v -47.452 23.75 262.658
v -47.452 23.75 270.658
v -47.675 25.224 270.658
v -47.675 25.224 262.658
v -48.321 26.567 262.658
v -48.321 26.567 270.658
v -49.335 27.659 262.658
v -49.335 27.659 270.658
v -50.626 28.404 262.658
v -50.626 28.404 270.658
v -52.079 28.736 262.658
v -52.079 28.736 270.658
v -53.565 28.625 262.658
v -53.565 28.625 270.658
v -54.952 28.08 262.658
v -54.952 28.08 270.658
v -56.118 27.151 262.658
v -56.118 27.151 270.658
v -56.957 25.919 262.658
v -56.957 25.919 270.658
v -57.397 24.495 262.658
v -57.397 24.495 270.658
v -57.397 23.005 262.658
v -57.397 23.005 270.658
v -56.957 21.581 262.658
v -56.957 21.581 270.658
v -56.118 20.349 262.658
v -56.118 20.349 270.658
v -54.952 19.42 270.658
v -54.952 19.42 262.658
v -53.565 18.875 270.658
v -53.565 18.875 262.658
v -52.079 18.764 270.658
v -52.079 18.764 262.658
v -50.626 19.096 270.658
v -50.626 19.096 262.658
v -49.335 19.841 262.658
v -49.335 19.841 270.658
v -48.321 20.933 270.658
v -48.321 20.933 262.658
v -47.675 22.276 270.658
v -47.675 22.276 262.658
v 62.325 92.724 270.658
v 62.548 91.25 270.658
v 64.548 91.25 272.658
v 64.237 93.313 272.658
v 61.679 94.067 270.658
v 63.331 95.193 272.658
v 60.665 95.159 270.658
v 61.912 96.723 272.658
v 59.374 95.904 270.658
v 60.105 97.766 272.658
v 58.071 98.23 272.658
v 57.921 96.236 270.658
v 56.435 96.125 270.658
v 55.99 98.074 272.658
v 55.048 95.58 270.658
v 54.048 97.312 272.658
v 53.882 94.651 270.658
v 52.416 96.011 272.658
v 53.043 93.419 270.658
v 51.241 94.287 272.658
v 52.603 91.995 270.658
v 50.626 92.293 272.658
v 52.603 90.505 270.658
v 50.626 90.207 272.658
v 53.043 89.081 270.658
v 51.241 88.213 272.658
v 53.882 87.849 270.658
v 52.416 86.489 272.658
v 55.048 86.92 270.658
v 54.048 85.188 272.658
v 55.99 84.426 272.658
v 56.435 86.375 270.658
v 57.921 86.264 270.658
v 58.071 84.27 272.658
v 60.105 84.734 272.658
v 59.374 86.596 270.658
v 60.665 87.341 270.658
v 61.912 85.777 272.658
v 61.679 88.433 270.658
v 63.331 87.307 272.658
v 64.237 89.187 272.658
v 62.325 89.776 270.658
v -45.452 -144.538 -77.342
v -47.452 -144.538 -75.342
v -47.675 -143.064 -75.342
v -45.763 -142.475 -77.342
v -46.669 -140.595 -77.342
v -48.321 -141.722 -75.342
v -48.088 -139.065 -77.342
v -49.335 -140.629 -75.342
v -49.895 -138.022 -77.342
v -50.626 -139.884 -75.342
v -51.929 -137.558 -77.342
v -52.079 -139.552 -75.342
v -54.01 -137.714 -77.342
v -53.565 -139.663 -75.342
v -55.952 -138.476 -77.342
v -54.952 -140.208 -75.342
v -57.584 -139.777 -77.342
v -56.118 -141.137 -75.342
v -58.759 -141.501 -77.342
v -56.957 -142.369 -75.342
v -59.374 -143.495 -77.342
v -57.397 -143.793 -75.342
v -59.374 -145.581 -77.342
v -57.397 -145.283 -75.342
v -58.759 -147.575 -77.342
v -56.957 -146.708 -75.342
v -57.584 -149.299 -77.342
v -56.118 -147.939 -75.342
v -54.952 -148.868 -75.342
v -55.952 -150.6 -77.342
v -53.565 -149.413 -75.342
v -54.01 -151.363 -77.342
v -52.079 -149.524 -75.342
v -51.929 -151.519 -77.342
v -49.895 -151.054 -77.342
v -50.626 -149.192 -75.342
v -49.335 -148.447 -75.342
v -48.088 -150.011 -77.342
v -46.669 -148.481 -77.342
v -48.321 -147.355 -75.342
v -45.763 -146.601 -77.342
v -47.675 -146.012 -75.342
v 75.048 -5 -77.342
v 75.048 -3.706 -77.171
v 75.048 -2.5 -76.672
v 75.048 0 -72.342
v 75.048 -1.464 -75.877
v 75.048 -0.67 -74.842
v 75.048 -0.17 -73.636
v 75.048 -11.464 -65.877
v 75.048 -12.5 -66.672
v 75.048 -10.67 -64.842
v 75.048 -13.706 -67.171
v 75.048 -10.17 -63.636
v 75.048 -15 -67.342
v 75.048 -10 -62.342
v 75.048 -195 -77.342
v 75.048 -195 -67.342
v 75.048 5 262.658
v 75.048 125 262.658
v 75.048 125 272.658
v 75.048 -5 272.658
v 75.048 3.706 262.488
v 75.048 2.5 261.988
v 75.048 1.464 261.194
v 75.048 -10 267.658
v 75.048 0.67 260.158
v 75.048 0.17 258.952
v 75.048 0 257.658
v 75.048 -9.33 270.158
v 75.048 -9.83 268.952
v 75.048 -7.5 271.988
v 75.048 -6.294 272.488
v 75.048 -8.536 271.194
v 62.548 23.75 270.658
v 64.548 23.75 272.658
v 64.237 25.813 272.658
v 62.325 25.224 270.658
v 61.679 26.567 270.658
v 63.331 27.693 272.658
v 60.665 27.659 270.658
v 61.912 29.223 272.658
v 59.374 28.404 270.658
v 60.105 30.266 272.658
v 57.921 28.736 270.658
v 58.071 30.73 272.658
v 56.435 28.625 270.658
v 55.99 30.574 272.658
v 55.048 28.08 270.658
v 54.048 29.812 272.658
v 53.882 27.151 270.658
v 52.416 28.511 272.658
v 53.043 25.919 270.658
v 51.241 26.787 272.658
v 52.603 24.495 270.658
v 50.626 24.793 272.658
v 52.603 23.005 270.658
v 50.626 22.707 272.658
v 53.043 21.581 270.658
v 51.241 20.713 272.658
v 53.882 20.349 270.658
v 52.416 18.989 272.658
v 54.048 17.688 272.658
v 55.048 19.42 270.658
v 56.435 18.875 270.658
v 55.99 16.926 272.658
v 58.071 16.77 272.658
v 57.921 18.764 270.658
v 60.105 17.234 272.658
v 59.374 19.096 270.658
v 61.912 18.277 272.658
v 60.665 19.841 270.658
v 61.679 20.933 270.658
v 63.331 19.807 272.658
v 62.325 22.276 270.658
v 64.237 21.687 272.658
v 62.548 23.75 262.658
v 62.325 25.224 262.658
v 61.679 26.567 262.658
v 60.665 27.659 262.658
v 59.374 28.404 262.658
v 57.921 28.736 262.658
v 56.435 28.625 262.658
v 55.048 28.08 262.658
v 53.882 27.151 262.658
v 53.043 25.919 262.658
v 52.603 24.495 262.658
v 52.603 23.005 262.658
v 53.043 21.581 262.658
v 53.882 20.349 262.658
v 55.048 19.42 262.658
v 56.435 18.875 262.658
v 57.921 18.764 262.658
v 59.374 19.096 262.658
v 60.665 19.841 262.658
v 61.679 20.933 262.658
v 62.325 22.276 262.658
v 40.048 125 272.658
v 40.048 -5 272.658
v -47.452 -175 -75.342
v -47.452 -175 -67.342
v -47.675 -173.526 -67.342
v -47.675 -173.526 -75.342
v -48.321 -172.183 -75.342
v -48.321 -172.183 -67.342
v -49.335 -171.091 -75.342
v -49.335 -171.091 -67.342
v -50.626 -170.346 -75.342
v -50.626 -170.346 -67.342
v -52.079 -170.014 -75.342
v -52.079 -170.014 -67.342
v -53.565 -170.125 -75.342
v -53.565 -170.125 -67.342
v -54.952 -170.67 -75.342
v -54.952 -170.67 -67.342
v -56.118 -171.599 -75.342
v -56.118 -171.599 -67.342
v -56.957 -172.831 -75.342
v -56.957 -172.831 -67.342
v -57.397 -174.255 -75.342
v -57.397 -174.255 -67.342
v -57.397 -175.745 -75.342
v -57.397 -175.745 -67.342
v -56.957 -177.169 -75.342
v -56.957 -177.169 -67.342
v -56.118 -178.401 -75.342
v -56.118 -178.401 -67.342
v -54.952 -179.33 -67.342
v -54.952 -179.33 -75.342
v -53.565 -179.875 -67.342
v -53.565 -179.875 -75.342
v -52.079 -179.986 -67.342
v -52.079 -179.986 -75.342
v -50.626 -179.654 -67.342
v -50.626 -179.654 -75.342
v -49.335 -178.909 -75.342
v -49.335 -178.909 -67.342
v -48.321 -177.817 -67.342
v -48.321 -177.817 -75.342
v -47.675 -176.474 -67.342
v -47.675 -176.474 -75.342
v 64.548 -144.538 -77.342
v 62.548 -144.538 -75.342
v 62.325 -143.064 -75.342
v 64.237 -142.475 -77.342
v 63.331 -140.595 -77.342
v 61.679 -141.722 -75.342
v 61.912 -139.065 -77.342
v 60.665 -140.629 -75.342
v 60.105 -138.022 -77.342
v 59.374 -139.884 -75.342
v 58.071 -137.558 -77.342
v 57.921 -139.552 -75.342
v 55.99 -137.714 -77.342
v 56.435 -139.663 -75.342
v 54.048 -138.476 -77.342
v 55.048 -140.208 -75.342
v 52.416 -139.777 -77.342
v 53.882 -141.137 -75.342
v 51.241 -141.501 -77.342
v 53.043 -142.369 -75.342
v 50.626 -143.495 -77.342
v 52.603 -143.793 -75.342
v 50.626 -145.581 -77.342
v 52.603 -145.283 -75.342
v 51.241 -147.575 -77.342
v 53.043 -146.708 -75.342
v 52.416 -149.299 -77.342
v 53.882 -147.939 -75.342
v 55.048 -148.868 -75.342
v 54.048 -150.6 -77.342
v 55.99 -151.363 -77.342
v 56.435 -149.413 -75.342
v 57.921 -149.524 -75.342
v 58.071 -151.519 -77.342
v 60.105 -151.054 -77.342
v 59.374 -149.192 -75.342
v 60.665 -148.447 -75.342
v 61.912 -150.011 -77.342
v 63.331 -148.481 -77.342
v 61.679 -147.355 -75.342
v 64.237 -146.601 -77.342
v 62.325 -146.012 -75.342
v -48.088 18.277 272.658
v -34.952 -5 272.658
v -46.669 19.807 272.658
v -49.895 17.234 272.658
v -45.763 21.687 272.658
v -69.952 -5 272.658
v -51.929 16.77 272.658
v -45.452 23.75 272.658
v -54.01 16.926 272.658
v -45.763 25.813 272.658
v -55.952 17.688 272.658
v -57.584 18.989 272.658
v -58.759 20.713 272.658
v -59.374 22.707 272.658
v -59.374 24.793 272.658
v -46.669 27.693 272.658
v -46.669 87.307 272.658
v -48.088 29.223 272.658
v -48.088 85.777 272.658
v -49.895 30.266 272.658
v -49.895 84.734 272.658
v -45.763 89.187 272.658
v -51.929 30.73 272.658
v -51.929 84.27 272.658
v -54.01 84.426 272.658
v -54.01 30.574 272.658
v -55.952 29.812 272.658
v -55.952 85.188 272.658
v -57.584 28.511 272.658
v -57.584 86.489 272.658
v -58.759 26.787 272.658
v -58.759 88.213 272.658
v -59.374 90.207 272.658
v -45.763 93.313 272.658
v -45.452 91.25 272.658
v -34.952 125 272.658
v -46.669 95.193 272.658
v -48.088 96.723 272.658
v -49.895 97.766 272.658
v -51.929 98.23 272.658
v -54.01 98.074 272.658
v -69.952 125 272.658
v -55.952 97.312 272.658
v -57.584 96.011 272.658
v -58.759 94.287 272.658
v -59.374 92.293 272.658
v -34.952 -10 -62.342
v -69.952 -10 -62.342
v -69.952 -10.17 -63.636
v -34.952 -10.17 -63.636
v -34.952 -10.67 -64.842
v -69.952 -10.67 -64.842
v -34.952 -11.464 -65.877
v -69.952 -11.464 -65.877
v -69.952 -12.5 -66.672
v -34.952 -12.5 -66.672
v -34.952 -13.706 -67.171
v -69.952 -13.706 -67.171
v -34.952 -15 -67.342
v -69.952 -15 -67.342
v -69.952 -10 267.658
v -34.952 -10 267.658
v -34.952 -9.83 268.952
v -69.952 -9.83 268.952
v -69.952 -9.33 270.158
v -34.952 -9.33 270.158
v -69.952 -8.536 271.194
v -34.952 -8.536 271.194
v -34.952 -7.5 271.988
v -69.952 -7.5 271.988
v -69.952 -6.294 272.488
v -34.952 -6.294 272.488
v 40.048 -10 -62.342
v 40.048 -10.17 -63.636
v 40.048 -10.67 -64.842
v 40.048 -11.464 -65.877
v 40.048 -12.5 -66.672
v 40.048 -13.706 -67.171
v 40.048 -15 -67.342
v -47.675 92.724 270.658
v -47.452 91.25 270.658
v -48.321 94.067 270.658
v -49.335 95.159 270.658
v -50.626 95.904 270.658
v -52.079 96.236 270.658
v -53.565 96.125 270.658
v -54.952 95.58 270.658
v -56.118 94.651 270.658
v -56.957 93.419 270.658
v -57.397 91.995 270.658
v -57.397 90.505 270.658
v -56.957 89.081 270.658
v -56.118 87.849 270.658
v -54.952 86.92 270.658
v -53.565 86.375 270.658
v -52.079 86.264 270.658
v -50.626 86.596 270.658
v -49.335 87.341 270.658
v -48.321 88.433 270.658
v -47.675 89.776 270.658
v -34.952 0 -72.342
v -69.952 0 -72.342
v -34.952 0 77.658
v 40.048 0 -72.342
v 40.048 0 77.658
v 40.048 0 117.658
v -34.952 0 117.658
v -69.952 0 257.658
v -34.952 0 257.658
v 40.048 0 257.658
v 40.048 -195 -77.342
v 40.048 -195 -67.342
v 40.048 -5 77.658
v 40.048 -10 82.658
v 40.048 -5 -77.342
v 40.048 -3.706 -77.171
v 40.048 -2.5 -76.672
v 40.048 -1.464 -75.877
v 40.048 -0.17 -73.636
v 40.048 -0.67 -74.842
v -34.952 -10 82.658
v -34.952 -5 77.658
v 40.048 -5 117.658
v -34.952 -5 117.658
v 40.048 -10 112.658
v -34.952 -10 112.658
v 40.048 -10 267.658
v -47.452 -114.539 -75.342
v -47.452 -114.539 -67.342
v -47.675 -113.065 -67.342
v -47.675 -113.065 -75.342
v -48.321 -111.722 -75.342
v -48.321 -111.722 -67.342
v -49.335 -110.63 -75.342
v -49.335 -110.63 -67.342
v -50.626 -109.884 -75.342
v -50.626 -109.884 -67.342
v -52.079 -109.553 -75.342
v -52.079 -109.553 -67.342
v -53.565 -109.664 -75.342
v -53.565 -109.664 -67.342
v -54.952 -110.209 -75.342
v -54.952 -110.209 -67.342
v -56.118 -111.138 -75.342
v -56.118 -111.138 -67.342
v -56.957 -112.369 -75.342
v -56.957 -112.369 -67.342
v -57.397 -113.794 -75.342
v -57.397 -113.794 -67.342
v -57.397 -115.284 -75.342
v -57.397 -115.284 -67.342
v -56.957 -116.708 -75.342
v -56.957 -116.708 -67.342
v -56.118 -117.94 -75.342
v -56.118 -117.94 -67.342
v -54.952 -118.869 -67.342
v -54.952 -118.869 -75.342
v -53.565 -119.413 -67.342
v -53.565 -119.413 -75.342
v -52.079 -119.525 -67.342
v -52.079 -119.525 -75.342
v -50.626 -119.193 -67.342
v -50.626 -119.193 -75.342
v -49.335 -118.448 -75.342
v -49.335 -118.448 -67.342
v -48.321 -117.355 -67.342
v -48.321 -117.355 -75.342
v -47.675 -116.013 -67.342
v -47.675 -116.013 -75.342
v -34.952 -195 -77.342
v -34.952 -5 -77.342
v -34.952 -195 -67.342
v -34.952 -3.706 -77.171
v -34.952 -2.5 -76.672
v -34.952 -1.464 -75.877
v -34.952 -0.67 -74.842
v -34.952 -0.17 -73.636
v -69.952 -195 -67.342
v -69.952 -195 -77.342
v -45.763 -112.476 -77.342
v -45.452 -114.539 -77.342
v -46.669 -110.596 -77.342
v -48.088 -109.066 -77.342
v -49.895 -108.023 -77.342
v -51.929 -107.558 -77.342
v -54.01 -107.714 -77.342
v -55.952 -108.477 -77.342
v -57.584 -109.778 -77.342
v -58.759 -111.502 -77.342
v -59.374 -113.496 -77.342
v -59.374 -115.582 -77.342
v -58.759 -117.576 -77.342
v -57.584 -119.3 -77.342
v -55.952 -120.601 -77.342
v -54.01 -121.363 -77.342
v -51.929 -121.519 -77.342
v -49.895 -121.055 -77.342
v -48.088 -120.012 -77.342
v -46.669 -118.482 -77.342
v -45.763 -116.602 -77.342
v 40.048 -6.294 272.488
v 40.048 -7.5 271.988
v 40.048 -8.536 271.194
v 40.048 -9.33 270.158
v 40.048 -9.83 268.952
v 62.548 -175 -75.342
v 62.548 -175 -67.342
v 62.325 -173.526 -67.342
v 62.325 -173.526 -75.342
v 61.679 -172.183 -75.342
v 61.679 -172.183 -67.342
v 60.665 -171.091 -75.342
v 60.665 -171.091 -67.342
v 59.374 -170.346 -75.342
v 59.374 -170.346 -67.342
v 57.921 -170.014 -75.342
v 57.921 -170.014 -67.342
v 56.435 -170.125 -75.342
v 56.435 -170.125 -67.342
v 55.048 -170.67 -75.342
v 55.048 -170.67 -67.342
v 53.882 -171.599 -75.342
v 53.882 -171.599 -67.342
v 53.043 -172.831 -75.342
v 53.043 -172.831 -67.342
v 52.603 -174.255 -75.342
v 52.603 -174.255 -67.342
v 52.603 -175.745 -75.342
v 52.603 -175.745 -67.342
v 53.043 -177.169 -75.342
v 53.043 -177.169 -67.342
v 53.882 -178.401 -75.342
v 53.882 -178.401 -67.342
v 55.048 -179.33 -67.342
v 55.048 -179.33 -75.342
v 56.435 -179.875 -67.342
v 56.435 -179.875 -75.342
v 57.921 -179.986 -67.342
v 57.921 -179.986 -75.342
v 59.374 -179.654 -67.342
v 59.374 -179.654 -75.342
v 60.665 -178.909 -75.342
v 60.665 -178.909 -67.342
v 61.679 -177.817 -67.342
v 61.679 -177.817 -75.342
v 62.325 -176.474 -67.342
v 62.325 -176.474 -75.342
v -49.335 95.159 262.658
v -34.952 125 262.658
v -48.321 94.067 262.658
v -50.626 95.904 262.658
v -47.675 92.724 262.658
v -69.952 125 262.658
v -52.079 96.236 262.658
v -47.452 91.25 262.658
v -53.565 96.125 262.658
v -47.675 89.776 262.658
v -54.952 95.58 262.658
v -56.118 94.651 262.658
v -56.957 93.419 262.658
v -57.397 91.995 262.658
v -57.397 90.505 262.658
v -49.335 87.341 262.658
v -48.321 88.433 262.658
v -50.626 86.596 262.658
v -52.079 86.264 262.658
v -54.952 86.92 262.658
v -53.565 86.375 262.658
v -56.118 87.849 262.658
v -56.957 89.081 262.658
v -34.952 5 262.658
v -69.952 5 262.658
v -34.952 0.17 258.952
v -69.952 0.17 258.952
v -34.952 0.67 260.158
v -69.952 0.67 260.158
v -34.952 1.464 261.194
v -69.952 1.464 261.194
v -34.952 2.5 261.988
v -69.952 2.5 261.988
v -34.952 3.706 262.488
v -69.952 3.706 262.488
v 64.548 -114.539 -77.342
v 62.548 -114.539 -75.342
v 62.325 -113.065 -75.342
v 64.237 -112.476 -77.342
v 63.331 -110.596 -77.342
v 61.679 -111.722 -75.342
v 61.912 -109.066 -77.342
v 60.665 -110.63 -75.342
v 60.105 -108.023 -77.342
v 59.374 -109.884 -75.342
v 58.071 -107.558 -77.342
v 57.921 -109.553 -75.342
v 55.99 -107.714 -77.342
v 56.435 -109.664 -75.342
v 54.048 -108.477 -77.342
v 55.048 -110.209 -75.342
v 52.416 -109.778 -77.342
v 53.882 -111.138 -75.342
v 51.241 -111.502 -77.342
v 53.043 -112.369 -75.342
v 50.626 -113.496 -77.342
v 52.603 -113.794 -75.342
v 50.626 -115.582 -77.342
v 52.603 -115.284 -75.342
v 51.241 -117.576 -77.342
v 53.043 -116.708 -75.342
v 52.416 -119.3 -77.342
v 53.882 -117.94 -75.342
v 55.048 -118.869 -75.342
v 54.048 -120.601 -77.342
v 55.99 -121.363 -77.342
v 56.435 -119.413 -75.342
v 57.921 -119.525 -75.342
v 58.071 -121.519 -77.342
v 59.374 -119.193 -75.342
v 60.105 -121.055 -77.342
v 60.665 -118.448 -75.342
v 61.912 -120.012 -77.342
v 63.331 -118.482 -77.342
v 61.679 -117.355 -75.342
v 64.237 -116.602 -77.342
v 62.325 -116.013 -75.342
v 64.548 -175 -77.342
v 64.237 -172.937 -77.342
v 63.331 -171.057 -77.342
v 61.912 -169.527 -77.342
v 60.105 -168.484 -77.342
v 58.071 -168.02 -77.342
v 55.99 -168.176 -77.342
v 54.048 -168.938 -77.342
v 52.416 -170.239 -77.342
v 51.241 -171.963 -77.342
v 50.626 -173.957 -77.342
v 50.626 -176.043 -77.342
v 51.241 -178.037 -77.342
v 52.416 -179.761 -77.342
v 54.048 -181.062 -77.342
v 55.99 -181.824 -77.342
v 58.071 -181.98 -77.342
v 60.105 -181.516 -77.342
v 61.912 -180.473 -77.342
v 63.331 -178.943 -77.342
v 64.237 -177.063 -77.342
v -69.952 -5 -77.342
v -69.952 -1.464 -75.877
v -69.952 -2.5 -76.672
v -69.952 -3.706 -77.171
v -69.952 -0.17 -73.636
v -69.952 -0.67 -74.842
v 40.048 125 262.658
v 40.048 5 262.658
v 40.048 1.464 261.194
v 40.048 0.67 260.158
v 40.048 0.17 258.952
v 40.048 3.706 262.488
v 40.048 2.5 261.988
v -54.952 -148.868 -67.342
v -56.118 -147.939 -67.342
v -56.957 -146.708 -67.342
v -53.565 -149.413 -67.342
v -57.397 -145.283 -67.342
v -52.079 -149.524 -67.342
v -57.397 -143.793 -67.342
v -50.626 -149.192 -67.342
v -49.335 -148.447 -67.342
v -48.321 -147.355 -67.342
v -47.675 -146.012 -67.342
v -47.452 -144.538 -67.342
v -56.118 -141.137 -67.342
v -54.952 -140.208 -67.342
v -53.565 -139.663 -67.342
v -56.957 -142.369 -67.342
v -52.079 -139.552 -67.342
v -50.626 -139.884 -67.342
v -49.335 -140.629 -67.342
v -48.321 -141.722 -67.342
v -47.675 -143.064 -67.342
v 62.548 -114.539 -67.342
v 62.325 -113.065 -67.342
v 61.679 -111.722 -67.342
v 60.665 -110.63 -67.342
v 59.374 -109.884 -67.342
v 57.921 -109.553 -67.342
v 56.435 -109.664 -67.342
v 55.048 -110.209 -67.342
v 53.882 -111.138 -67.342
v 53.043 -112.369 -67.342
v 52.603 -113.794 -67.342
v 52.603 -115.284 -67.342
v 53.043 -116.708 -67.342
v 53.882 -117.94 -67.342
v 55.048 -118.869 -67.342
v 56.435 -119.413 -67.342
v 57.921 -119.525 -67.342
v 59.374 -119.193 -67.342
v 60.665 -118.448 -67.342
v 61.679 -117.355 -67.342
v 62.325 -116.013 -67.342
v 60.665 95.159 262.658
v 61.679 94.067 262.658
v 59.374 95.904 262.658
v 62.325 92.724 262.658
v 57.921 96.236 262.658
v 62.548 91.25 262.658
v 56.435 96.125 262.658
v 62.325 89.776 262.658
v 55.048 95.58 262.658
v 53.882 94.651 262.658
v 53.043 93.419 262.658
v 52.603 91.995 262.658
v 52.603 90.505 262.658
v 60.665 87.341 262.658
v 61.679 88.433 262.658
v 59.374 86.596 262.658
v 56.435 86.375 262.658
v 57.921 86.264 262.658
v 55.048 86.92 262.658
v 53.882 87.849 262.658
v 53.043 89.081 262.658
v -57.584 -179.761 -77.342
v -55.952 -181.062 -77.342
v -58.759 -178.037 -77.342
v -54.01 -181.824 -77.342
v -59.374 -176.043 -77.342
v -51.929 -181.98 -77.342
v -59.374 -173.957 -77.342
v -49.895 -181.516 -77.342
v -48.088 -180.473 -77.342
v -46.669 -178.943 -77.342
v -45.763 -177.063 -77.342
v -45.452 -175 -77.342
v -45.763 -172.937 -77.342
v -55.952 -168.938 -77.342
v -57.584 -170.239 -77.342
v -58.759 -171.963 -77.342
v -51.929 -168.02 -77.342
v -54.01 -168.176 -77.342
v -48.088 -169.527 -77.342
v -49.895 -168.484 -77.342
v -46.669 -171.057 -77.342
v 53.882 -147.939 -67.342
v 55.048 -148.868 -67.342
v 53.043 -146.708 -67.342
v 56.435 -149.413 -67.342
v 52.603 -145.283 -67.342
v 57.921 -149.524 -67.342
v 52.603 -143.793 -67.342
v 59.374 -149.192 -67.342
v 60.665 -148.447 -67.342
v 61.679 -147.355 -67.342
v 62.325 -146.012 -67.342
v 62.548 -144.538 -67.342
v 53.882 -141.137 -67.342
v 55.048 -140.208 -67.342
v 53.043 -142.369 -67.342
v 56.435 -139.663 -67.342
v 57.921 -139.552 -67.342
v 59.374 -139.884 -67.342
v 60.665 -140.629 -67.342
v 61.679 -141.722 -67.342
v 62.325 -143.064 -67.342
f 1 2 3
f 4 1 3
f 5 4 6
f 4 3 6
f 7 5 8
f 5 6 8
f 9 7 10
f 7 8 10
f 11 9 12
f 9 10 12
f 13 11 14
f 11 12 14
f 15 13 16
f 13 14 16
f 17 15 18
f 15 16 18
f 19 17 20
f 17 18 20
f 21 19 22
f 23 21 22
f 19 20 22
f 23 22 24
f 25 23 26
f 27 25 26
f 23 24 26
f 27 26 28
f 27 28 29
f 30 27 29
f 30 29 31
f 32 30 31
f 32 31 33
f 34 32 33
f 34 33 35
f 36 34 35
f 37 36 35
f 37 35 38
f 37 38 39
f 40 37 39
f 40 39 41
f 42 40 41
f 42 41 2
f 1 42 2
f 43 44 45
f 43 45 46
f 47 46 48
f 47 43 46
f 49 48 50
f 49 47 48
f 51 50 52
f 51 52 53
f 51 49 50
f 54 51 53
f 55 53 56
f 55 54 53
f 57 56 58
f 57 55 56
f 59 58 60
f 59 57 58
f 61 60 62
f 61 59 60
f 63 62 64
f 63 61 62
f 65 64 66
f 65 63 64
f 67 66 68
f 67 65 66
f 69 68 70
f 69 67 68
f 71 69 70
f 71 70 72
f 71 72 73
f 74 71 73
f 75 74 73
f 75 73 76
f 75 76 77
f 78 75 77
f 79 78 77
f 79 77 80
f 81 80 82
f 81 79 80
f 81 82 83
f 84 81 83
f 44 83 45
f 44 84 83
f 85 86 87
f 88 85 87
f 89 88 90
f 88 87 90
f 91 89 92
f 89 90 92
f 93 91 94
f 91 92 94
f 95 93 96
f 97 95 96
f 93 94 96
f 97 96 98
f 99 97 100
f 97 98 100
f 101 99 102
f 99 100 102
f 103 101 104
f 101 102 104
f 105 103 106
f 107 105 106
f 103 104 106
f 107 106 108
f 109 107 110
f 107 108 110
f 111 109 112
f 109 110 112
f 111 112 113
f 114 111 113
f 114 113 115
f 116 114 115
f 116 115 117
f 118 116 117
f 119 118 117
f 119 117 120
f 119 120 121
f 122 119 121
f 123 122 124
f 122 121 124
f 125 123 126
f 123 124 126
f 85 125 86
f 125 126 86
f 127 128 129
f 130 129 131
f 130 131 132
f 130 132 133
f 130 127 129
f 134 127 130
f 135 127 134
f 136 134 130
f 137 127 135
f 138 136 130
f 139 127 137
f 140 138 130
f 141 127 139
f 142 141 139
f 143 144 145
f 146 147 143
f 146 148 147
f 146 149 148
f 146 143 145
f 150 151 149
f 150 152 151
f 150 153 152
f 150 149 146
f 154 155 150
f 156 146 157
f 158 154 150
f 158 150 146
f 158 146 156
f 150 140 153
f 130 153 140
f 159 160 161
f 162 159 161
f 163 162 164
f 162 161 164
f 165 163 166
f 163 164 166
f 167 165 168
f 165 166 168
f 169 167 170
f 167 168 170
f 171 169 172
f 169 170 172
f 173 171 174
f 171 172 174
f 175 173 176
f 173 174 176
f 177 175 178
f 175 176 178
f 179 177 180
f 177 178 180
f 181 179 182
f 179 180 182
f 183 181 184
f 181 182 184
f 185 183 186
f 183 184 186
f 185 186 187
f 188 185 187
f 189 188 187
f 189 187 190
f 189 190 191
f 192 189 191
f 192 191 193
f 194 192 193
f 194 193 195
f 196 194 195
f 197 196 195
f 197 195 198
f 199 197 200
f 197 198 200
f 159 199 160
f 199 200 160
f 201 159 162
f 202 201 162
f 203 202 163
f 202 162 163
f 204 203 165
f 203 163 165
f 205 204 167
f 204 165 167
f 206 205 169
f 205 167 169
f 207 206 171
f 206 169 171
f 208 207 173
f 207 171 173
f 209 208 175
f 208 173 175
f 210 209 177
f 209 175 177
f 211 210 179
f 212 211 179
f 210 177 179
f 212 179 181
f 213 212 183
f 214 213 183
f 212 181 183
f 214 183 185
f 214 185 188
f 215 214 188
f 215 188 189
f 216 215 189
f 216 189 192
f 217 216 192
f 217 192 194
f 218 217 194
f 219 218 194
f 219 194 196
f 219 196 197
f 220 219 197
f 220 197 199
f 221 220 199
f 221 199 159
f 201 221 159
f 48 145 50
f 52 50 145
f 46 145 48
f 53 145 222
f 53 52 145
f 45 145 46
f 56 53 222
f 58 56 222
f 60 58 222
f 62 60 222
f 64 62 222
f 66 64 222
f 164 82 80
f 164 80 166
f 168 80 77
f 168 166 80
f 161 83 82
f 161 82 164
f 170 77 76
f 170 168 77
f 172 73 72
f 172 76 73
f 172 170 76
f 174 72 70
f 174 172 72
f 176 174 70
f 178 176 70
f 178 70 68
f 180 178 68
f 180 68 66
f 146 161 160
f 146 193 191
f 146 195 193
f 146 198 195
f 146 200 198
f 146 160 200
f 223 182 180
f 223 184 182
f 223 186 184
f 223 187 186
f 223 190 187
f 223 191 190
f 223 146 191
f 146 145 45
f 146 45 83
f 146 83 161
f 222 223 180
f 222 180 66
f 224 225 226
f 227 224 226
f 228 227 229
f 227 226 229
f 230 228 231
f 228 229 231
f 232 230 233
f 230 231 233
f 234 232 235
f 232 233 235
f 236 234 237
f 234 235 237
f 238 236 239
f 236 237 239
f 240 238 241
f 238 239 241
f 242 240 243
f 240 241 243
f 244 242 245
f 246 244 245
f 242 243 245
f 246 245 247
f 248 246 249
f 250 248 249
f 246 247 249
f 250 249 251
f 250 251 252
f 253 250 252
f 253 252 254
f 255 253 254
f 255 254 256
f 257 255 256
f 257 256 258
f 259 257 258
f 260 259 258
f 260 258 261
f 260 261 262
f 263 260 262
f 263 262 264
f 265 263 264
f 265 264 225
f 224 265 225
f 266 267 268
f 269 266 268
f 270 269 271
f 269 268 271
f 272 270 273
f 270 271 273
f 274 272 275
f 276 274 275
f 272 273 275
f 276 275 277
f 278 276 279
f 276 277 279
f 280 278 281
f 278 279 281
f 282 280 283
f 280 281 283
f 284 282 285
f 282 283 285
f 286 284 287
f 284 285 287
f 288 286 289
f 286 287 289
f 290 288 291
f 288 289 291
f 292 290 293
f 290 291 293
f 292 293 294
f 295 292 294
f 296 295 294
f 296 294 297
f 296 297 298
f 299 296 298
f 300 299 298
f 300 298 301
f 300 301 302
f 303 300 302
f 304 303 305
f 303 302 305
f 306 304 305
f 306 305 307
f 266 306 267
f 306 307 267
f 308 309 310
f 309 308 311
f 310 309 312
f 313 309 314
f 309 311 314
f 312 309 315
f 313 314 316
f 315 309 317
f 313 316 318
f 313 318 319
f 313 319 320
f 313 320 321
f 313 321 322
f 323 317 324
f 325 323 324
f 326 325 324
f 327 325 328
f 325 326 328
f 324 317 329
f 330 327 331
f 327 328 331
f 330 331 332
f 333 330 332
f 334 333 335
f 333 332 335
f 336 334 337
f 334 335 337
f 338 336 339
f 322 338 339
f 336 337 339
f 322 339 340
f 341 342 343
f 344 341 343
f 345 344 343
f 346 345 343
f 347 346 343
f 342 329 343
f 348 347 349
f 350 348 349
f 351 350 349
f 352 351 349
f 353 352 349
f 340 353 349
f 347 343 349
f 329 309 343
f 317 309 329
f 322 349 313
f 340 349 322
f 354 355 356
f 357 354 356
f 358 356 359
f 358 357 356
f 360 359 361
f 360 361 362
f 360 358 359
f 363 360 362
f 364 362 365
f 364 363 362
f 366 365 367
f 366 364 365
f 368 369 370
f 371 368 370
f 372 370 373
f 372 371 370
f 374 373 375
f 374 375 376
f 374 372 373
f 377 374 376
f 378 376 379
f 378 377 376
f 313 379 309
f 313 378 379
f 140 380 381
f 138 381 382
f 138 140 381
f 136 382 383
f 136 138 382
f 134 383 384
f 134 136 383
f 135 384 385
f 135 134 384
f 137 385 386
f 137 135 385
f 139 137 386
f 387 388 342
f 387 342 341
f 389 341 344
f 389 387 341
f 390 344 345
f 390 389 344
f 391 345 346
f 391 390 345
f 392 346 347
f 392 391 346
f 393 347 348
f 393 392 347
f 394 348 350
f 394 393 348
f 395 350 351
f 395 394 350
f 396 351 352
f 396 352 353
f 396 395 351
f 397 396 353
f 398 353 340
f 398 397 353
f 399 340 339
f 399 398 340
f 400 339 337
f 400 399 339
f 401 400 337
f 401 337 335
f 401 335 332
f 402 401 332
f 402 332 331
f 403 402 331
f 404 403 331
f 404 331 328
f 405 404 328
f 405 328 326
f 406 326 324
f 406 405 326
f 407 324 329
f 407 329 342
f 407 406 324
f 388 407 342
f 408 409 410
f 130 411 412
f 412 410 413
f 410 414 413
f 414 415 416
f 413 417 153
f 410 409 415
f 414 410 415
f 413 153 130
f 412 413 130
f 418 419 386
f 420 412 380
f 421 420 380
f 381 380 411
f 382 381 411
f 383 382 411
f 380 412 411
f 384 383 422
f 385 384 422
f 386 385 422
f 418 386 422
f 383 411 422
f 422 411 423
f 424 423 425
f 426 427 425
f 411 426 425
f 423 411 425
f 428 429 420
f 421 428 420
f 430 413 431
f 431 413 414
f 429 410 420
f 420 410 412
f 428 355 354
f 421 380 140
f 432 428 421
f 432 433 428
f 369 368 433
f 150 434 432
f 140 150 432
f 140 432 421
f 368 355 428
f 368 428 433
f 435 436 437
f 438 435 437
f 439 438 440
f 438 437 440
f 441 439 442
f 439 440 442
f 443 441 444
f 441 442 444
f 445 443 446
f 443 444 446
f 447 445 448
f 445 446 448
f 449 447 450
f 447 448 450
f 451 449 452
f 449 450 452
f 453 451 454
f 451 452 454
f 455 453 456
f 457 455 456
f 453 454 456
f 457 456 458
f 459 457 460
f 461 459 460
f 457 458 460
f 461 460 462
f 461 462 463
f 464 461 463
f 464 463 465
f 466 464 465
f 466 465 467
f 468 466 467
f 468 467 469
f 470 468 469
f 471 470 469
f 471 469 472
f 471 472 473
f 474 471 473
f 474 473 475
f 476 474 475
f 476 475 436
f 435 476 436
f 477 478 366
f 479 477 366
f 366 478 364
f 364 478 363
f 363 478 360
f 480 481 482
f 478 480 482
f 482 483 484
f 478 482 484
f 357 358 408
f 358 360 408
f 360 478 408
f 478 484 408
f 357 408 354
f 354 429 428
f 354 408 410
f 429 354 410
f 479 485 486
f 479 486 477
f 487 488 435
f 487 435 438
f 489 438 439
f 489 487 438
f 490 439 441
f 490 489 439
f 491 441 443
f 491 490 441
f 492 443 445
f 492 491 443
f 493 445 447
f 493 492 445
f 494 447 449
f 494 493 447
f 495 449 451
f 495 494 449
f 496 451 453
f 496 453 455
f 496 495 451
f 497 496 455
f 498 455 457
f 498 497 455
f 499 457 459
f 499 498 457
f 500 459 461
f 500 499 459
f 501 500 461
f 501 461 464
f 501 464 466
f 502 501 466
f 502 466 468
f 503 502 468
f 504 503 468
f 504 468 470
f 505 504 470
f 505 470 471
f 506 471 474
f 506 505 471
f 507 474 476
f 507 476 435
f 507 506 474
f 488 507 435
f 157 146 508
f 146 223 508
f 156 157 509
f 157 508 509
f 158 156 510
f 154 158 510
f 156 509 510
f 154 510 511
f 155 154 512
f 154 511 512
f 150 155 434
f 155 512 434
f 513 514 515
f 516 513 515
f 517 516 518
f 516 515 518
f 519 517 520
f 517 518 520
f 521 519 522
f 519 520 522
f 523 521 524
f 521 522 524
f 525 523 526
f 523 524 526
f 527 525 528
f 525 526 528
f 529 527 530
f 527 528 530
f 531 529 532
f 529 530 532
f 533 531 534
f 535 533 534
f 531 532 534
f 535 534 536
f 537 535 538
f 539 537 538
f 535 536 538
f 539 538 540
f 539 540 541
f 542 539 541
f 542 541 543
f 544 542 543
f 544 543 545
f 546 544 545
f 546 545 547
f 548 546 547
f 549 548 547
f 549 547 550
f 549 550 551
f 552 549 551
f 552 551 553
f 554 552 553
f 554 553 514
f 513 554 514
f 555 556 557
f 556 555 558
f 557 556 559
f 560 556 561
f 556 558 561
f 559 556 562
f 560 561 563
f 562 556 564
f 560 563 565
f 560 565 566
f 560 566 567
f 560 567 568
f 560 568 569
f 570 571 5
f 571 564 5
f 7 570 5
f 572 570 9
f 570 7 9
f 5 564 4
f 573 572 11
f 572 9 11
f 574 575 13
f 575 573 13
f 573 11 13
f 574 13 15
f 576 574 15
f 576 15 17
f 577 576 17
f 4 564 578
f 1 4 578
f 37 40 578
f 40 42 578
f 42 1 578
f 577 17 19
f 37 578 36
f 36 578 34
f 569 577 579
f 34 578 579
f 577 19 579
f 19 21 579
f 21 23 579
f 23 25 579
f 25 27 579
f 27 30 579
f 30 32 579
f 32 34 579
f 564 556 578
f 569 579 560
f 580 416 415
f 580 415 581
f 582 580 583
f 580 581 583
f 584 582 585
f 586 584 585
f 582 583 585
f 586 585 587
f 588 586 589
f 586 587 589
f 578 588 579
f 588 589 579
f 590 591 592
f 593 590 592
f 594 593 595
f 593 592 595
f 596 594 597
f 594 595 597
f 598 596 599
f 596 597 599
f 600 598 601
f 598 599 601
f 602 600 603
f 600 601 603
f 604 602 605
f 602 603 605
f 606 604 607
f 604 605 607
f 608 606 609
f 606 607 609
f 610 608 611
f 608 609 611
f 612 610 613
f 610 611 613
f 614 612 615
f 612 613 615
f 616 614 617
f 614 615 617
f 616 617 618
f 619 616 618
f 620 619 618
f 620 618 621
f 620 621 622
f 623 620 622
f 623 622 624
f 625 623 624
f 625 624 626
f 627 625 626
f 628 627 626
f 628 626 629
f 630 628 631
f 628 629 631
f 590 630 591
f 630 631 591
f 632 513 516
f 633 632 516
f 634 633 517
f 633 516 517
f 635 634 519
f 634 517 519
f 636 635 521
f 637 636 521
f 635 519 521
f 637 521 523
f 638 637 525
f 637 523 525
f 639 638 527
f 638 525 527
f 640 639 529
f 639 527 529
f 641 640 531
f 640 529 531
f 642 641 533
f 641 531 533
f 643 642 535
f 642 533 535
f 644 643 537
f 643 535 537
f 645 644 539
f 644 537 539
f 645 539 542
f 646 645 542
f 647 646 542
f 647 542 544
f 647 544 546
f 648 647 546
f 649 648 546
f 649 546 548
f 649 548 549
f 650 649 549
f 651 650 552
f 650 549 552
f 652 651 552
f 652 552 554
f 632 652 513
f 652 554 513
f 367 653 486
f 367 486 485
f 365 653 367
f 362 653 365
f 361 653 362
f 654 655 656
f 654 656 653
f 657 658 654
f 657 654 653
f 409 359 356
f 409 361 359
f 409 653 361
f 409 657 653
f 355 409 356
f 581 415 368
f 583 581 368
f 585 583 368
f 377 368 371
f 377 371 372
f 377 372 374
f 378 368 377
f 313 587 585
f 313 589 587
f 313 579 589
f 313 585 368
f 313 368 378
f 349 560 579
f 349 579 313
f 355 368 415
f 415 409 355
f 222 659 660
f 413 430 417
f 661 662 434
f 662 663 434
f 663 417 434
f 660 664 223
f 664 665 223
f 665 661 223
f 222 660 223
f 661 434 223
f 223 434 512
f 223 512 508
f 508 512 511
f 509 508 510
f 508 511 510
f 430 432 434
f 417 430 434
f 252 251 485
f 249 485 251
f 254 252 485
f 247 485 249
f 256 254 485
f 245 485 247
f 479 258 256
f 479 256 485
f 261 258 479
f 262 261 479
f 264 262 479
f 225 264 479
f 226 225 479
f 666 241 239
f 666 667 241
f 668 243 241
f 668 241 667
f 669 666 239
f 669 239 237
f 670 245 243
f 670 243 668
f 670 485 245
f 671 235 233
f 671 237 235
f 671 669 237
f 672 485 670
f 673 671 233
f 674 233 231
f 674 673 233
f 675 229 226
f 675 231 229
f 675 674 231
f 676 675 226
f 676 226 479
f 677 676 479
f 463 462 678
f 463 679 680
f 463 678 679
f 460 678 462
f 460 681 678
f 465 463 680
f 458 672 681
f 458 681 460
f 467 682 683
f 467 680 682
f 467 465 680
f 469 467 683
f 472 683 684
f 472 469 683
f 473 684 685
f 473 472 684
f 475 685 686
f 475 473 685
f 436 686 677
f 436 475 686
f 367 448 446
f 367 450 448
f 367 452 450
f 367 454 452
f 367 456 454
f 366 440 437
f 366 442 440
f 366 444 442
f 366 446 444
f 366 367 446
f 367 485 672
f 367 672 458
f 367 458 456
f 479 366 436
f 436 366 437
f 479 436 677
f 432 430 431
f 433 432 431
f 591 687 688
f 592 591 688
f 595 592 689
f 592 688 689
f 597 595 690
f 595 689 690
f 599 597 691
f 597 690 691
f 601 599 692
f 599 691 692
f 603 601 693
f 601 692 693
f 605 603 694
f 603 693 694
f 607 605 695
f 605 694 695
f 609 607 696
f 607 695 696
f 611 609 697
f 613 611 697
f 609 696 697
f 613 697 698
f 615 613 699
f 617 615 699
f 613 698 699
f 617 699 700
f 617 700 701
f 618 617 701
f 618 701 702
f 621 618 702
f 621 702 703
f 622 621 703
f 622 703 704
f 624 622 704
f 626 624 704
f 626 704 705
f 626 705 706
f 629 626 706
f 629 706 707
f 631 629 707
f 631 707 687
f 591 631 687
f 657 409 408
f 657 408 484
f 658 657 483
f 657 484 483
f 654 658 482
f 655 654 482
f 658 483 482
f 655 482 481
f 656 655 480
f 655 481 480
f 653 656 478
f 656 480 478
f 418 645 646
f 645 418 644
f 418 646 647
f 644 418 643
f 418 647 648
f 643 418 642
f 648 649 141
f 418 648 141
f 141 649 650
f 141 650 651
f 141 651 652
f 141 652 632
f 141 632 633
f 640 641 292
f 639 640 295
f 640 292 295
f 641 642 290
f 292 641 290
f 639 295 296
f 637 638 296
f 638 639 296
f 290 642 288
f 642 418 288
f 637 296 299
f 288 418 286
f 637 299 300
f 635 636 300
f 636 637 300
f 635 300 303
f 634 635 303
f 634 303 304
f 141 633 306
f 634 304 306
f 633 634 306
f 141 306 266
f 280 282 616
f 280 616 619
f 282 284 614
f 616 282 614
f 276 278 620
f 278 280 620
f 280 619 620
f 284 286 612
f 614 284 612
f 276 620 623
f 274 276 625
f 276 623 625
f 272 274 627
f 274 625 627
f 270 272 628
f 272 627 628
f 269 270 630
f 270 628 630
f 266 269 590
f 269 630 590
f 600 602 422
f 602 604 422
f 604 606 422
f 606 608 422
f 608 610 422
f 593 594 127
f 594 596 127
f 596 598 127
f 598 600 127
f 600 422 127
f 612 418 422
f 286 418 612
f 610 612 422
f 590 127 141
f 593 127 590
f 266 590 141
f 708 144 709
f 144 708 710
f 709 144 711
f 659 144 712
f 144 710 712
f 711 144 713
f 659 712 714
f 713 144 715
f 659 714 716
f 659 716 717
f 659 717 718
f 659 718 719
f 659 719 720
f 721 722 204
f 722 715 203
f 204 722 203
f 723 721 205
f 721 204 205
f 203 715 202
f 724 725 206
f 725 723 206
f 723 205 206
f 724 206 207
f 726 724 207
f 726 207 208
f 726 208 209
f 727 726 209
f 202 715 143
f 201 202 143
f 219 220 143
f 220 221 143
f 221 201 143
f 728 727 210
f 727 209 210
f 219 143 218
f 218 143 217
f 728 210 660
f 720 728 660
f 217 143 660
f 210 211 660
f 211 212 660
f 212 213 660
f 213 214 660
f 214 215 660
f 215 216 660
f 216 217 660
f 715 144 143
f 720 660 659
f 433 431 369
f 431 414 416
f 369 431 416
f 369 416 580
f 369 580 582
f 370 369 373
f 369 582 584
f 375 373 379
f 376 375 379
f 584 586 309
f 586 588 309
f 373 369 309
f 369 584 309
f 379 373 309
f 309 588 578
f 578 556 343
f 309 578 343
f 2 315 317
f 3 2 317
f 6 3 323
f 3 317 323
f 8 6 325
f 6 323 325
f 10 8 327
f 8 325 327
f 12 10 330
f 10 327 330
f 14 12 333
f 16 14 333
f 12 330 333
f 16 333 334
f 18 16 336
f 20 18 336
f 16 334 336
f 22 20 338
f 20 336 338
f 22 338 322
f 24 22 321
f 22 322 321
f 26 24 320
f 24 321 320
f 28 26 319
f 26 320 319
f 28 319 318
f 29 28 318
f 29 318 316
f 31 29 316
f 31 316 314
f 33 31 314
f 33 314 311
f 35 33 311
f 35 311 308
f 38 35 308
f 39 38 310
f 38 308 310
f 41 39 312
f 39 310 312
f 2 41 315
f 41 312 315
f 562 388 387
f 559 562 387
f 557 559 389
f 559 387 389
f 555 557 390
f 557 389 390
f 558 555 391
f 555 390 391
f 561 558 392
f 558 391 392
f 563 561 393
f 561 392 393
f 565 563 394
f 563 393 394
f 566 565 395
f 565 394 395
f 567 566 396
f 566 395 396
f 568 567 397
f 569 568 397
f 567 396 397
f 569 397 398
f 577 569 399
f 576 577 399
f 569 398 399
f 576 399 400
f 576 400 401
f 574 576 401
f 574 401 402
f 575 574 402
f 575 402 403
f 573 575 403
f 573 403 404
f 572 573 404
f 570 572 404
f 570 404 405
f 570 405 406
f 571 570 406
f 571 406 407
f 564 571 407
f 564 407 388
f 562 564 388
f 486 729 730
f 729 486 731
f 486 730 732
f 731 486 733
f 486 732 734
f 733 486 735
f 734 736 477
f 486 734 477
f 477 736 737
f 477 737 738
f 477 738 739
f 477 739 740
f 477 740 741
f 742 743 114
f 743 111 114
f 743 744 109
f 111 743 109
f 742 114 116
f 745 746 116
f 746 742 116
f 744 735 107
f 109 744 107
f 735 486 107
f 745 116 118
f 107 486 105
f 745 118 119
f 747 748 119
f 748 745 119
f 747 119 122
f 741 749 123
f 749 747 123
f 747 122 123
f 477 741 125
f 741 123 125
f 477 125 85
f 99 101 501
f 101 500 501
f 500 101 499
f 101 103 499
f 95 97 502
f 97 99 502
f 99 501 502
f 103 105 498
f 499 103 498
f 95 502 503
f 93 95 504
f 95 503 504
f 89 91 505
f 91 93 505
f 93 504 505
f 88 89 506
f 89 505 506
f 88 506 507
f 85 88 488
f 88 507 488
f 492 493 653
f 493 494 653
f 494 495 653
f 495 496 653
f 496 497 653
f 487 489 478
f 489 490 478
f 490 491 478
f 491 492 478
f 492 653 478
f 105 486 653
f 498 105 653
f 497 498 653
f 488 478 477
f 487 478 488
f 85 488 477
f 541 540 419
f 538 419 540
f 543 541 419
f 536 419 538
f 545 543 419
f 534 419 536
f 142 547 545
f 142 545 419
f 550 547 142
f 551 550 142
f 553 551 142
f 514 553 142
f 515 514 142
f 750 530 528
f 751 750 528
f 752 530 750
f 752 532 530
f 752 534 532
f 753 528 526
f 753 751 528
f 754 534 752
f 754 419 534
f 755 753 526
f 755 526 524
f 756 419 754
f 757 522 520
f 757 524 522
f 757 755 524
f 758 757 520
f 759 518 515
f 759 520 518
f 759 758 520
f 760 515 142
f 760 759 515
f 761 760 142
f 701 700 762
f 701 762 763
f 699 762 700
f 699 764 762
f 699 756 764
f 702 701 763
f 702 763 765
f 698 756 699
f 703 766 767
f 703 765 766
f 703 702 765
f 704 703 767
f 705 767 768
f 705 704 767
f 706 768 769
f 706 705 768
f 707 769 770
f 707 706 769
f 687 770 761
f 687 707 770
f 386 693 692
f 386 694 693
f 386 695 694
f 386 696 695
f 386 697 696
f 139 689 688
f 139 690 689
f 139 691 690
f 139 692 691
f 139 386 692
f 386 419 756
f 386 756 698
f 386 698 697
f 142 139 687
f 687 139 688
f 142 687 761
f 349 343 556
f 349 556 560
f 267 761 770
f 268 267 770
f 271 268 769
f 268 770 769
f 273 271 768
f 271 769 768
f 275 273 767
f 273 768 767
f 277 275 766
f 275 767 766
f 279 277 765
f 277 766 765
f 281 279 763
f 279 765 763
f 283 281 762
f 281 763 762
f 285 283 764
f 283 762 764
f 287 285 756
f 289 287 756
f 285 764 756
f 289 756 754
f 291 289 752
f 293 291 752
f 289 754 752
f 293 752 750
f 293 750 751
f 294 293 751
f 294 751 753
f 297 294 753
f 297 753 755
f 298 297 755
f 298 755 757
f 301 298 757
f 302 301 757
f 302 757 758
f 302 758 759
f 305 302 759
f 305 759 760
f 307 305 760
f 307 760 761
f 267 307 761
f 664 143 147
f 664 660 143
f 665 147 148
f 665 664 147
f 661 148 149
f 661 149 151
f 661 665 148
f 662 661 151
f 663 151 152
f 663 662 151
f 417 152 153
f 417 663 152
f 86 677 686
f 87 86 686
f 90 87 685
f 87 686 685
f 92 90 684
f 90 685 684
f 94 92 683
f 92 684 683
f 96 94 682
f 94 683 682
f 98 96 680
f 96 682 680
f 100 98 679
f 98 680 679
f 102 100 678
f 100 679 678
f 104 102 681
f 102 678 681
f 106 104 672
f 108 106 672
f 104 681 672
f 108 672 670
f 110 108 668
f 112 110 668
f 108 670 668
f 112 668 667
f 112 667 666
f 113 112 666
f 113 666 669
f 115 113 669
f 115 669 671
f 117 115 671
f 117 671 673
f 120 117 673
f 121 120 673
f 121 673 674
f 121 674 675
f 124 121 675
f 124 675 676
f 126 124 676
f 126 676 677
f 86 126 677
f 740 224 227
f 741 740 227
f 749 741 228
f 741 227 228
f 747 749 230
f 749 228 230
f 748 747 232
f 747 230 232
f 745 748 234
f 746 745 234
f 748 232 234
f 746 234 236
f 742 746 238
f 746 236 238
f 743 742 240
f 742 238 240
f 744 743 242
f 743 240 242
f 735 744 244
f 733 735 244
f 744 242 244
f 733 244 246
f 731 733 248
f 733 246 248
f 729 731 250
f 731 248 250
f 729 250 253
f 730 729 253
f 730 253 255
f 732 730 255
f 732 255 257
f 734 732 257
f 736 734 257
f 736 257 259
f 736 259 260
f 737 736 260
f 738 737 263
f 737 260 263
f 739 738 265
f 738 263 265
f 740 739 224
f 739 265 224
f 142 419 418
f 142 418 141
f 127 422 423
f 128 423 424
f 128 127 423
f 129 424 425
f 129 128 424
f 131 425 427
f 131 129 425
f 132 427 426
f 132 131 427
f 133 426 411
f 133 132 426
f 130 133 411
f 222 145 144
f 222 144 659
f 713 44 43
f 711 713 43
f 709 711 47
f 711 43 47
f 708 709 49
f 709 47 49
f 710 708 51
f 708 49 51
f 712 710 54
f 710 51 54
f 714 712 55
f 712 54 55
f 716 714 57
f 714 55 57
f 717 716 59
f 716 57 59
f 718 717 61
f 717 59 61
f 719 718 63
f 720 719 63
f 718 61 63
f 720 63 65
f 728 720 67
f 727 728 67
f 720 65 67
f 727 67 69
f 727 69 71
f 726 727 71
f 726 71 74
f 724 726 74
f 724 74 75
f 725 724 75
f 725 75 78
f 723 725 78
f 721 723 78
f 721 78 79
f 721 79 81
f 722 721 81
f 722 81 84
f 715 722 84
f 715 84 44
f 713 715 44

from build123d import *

# Parameters (mm, degrees)
F1_DEPTH = 10
F2_W     = 35
F2_H     = 10
F3_DEPTH = 185
F4_R     = 5
F5_DEPTH = 25
F6_W     = 35
F6_H     = 10
F7_DEPTH = 125
F8_R     = 5
F9_DEPTH = 25
F10_R    = 5
F11_SIZE = 5
F12_SIZE = 2


with BuildPart() as f1:
    # F0 (on Front) → F1 (new body)
    with BuildSketch(Plane.XZ):
        Polygon((-34.9524939805, 272.6582099839), (-69.9524939805, 272.6582099839), (-69.9524939805, -77.3417900161), (-34.9524939805, -77.3417900161), (-34.9524939805, 77.6582099839), (-34.9524939805, 97.6582099839), (-34.9524939805, 117.6582099839), align=None)
        Polygon((40.0475060195, 117.6582099839), (-34.9524939805, 117.6582099839), (-34.9524939805, 97.6582099839), (-34.9524939805, 77.6582099839), (40.0475060195, 77.6582099839), align=None)
        Polygon((40.0475060195, 272.6582099839), (40.0475060195, 117.6582099839), (40.0475060195, 77.6582099839), (40.0475060195, -77.3417900161), (75.0475060195, -77.3417900161), (75.0475060195, 272.6582099839), align=None)
    extrude(amount=F1_DEPTH)

    # F2 (on face) → F3 (join)
    with BuildSketch(Plane.XZ.offset(10)):
        with Locations((-52.4524939805, -72.3417900161)):
            Rectangle(F2_W, F2_H)
        with Locations((57.5475060195, -72.3417900161)):
            Rectangle(F2_W, F2_H)
    extrude(amount=F3_DEPTH)

    # F4 (on face) → F5 (cut)
    with BuildSketch(Plane.XY.offset(-67.3417900161)):
        with Locations((57.5475060195, -114.538833499)):
            Circle(F4_R)
        with Locations((57.5475060195, -144.5381194353)):
            Circle(F4_R)
        with Locations((57.5475060195, -175)):
            Circle(F4_R)
        with Locations((-52.4524939805, -114.538833499)):
            Circle(F4_R)
        with Locations((-52.4524939805, -144.5381194353)):
            Circle(F4_R)
        with Locations((-52.4524939805, -175)):
            Circle(F4_R)
    extrude(amount=-F5_DEPTH, mode=Mode.SUBTRACT)

    # F6 (on face) → F7 (join)
    with BuildSketch(Plane(origin=(0, 0, 0), x_dir=(-1, 0, 0), z_dir=(0, 1, 0))):
        with Locations((-57.5475060195, 267.6582099839)):
            Rectangle(F6_W, F6_H)
        with Locations((52.4524939805, 267.6582099839)):
            Rectangle(F6_W, F6_H)
    extrude(amount=F7_DEPTH)

    # F8 (on face) → F9 (cut)
    with BuildSketch(Plane.XY.offset(272.6582099839)):
        with Locations((-52.4524939805, 23.75)):
            Circle(F8_R)
        with Locations((-52.4524939805, 91.25)):
            Circle(F8_R)
        with Locations((57.5475060195, 91.25)):
            Circle(F8_R)
        with Locations((57.5475060195, 23.75)):
            Circle(F8_R)
    extrude(amount=-F9_DEPTH, mode=Mode.SUBTRACT)

    # F10
    f10_edges = [f1.edges().sort_by_distance(p)[0] for p in [
        (-52.452494, -10, 272.65821),
        (57.547506, -10, 272.65821),
        (-52.452494, -10, -67.34179),
        (57.547506, -10, -67.34179),
        (-52.452494, 0, -77.34179),
        (57.547506, 0, -77.34179),
        (-52.452494, 0, 262.65821),
        (57.547506, 0, 262.65821),
    ]]
    fillet(f10_edges, radius=F10_R)

    # F11
    f11_edges = [f1.edges().sort_by_distance(p)[0] for p in [
        (2.547506, -10, 77.65821),
        (2.547506, -10, 117.65821),
    ]]
    chamfer(f11_edges, length=F11_SIZE)

    # F12
    f12_edges = [f1.edges().sort_by_distance(p)[0] for p in [
        (52.547506, 23.75, 272.65821),
        (52.547506, 91.25, 272.65821),
        (-57.452494, 23.75, 272.65821),
        (-57.452494, 91.25, 272.65821),
        (-57.452494, -175, -77.34179),
        (-57.452494, -144.538119, -77.34179),
        (-57.452494, -114.538833, -77.34179),
        (52.547506, -114.538833, -77.34179),
        (52.547506, -144.538119, -77.34179),
        (52.547506, -175, -77.34179),
    ]]
    chamfer(f12_edges, length=F12_SIZE)


solid = f1.part
